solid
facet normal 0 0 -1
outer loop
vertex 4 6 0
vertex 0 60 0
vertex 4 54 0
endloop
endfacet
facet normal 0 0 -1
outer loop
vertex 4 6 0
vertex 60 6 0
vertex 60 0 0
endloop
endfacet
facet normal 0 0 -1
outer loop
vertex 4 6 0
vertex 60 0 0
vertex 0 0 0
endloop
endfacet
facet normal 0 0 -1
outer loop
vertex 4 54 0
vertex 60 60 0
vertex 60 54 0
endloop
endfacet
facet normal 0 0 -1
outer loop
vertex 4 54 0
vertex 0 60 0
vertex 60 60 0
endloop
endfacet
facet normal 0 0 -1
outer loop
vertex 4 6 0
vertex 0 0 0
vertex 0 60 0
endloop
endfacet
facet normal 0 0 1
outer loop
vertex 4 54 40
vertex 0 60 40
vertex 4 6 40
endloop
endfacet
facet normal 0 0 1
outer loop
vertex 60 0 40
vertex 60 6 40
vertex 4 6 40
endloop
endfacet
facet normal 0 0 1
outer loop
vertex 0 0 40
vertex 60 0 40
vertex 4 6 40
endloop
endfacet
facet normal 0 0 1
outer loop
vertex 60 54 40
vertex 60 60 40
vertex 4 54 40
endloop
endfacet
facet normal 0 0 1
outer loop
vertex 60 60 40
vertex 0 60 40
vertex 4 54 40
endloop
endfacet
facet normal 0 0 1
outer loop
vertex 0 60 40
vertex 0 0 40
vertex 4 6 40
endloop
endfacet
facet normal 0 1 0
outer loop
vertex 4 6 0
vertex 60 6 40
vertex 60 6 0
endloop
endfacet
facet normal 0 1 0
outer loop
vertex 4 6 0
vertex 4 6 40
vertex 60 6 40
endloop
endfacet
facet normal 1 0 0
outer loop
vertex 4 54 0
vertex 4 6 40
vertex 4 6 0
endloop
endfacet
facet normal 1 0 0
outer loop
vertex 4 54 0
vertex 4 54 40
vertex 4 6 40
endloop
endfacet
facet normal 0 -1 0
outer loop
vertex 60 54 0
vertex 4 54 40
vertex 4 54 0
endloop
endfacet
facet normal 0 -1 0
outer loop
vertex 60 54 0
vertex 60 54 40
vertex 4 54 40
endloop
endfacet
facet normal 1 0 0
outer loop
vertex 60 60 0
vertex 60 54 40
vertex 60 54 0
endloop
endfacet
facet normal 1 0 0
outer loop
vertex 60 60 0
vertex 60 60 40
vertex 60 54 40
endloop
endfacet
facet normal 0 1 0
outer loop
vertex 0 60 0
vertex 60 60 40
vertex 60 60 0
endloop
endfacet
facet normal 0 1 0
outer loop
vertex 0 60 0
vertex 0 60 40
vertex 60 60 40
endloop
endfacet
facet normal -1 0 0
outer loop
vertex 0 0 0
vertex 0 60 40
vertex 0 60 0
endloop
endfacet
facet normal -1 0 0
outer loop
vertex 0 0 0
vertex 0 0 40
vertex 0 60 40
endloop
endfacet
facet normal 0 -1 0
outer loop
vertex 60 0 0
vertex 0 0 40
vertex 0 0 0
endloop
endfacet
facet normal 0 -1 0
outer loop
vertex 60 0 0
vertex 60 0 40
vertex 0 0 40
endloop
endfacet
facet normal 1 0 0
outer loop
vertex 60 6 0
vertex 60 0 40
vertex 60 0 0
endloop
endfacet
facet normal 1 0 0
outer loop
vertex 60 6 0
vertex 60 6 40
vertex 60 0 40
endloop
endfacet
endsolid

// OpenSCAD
$fn = 32;

// ----------------------------------------------------------------------
// Structural section: channel 60 x 60 mm
// ----------------------------------------------------------------------

// --- parameters (mm) ---
sec_w = 60;               // channel width, X
sec_h = 60;               // channel height, Y
flange_t = 6;             // flange thickness
web_t = 4;                // web thickness
plate_t = 40;             // cut length, Z (extrusion height)

profile = [[0, 0], [60, 0], [60, 6], [4, 6], [4, 54], [60, 54], [60, 60], [0, 60]];  // primary outline, 8 points, counter clockwise

// --- the one profile operation ---
linear_extrude(height = plate_t) polygon(points = profile);
